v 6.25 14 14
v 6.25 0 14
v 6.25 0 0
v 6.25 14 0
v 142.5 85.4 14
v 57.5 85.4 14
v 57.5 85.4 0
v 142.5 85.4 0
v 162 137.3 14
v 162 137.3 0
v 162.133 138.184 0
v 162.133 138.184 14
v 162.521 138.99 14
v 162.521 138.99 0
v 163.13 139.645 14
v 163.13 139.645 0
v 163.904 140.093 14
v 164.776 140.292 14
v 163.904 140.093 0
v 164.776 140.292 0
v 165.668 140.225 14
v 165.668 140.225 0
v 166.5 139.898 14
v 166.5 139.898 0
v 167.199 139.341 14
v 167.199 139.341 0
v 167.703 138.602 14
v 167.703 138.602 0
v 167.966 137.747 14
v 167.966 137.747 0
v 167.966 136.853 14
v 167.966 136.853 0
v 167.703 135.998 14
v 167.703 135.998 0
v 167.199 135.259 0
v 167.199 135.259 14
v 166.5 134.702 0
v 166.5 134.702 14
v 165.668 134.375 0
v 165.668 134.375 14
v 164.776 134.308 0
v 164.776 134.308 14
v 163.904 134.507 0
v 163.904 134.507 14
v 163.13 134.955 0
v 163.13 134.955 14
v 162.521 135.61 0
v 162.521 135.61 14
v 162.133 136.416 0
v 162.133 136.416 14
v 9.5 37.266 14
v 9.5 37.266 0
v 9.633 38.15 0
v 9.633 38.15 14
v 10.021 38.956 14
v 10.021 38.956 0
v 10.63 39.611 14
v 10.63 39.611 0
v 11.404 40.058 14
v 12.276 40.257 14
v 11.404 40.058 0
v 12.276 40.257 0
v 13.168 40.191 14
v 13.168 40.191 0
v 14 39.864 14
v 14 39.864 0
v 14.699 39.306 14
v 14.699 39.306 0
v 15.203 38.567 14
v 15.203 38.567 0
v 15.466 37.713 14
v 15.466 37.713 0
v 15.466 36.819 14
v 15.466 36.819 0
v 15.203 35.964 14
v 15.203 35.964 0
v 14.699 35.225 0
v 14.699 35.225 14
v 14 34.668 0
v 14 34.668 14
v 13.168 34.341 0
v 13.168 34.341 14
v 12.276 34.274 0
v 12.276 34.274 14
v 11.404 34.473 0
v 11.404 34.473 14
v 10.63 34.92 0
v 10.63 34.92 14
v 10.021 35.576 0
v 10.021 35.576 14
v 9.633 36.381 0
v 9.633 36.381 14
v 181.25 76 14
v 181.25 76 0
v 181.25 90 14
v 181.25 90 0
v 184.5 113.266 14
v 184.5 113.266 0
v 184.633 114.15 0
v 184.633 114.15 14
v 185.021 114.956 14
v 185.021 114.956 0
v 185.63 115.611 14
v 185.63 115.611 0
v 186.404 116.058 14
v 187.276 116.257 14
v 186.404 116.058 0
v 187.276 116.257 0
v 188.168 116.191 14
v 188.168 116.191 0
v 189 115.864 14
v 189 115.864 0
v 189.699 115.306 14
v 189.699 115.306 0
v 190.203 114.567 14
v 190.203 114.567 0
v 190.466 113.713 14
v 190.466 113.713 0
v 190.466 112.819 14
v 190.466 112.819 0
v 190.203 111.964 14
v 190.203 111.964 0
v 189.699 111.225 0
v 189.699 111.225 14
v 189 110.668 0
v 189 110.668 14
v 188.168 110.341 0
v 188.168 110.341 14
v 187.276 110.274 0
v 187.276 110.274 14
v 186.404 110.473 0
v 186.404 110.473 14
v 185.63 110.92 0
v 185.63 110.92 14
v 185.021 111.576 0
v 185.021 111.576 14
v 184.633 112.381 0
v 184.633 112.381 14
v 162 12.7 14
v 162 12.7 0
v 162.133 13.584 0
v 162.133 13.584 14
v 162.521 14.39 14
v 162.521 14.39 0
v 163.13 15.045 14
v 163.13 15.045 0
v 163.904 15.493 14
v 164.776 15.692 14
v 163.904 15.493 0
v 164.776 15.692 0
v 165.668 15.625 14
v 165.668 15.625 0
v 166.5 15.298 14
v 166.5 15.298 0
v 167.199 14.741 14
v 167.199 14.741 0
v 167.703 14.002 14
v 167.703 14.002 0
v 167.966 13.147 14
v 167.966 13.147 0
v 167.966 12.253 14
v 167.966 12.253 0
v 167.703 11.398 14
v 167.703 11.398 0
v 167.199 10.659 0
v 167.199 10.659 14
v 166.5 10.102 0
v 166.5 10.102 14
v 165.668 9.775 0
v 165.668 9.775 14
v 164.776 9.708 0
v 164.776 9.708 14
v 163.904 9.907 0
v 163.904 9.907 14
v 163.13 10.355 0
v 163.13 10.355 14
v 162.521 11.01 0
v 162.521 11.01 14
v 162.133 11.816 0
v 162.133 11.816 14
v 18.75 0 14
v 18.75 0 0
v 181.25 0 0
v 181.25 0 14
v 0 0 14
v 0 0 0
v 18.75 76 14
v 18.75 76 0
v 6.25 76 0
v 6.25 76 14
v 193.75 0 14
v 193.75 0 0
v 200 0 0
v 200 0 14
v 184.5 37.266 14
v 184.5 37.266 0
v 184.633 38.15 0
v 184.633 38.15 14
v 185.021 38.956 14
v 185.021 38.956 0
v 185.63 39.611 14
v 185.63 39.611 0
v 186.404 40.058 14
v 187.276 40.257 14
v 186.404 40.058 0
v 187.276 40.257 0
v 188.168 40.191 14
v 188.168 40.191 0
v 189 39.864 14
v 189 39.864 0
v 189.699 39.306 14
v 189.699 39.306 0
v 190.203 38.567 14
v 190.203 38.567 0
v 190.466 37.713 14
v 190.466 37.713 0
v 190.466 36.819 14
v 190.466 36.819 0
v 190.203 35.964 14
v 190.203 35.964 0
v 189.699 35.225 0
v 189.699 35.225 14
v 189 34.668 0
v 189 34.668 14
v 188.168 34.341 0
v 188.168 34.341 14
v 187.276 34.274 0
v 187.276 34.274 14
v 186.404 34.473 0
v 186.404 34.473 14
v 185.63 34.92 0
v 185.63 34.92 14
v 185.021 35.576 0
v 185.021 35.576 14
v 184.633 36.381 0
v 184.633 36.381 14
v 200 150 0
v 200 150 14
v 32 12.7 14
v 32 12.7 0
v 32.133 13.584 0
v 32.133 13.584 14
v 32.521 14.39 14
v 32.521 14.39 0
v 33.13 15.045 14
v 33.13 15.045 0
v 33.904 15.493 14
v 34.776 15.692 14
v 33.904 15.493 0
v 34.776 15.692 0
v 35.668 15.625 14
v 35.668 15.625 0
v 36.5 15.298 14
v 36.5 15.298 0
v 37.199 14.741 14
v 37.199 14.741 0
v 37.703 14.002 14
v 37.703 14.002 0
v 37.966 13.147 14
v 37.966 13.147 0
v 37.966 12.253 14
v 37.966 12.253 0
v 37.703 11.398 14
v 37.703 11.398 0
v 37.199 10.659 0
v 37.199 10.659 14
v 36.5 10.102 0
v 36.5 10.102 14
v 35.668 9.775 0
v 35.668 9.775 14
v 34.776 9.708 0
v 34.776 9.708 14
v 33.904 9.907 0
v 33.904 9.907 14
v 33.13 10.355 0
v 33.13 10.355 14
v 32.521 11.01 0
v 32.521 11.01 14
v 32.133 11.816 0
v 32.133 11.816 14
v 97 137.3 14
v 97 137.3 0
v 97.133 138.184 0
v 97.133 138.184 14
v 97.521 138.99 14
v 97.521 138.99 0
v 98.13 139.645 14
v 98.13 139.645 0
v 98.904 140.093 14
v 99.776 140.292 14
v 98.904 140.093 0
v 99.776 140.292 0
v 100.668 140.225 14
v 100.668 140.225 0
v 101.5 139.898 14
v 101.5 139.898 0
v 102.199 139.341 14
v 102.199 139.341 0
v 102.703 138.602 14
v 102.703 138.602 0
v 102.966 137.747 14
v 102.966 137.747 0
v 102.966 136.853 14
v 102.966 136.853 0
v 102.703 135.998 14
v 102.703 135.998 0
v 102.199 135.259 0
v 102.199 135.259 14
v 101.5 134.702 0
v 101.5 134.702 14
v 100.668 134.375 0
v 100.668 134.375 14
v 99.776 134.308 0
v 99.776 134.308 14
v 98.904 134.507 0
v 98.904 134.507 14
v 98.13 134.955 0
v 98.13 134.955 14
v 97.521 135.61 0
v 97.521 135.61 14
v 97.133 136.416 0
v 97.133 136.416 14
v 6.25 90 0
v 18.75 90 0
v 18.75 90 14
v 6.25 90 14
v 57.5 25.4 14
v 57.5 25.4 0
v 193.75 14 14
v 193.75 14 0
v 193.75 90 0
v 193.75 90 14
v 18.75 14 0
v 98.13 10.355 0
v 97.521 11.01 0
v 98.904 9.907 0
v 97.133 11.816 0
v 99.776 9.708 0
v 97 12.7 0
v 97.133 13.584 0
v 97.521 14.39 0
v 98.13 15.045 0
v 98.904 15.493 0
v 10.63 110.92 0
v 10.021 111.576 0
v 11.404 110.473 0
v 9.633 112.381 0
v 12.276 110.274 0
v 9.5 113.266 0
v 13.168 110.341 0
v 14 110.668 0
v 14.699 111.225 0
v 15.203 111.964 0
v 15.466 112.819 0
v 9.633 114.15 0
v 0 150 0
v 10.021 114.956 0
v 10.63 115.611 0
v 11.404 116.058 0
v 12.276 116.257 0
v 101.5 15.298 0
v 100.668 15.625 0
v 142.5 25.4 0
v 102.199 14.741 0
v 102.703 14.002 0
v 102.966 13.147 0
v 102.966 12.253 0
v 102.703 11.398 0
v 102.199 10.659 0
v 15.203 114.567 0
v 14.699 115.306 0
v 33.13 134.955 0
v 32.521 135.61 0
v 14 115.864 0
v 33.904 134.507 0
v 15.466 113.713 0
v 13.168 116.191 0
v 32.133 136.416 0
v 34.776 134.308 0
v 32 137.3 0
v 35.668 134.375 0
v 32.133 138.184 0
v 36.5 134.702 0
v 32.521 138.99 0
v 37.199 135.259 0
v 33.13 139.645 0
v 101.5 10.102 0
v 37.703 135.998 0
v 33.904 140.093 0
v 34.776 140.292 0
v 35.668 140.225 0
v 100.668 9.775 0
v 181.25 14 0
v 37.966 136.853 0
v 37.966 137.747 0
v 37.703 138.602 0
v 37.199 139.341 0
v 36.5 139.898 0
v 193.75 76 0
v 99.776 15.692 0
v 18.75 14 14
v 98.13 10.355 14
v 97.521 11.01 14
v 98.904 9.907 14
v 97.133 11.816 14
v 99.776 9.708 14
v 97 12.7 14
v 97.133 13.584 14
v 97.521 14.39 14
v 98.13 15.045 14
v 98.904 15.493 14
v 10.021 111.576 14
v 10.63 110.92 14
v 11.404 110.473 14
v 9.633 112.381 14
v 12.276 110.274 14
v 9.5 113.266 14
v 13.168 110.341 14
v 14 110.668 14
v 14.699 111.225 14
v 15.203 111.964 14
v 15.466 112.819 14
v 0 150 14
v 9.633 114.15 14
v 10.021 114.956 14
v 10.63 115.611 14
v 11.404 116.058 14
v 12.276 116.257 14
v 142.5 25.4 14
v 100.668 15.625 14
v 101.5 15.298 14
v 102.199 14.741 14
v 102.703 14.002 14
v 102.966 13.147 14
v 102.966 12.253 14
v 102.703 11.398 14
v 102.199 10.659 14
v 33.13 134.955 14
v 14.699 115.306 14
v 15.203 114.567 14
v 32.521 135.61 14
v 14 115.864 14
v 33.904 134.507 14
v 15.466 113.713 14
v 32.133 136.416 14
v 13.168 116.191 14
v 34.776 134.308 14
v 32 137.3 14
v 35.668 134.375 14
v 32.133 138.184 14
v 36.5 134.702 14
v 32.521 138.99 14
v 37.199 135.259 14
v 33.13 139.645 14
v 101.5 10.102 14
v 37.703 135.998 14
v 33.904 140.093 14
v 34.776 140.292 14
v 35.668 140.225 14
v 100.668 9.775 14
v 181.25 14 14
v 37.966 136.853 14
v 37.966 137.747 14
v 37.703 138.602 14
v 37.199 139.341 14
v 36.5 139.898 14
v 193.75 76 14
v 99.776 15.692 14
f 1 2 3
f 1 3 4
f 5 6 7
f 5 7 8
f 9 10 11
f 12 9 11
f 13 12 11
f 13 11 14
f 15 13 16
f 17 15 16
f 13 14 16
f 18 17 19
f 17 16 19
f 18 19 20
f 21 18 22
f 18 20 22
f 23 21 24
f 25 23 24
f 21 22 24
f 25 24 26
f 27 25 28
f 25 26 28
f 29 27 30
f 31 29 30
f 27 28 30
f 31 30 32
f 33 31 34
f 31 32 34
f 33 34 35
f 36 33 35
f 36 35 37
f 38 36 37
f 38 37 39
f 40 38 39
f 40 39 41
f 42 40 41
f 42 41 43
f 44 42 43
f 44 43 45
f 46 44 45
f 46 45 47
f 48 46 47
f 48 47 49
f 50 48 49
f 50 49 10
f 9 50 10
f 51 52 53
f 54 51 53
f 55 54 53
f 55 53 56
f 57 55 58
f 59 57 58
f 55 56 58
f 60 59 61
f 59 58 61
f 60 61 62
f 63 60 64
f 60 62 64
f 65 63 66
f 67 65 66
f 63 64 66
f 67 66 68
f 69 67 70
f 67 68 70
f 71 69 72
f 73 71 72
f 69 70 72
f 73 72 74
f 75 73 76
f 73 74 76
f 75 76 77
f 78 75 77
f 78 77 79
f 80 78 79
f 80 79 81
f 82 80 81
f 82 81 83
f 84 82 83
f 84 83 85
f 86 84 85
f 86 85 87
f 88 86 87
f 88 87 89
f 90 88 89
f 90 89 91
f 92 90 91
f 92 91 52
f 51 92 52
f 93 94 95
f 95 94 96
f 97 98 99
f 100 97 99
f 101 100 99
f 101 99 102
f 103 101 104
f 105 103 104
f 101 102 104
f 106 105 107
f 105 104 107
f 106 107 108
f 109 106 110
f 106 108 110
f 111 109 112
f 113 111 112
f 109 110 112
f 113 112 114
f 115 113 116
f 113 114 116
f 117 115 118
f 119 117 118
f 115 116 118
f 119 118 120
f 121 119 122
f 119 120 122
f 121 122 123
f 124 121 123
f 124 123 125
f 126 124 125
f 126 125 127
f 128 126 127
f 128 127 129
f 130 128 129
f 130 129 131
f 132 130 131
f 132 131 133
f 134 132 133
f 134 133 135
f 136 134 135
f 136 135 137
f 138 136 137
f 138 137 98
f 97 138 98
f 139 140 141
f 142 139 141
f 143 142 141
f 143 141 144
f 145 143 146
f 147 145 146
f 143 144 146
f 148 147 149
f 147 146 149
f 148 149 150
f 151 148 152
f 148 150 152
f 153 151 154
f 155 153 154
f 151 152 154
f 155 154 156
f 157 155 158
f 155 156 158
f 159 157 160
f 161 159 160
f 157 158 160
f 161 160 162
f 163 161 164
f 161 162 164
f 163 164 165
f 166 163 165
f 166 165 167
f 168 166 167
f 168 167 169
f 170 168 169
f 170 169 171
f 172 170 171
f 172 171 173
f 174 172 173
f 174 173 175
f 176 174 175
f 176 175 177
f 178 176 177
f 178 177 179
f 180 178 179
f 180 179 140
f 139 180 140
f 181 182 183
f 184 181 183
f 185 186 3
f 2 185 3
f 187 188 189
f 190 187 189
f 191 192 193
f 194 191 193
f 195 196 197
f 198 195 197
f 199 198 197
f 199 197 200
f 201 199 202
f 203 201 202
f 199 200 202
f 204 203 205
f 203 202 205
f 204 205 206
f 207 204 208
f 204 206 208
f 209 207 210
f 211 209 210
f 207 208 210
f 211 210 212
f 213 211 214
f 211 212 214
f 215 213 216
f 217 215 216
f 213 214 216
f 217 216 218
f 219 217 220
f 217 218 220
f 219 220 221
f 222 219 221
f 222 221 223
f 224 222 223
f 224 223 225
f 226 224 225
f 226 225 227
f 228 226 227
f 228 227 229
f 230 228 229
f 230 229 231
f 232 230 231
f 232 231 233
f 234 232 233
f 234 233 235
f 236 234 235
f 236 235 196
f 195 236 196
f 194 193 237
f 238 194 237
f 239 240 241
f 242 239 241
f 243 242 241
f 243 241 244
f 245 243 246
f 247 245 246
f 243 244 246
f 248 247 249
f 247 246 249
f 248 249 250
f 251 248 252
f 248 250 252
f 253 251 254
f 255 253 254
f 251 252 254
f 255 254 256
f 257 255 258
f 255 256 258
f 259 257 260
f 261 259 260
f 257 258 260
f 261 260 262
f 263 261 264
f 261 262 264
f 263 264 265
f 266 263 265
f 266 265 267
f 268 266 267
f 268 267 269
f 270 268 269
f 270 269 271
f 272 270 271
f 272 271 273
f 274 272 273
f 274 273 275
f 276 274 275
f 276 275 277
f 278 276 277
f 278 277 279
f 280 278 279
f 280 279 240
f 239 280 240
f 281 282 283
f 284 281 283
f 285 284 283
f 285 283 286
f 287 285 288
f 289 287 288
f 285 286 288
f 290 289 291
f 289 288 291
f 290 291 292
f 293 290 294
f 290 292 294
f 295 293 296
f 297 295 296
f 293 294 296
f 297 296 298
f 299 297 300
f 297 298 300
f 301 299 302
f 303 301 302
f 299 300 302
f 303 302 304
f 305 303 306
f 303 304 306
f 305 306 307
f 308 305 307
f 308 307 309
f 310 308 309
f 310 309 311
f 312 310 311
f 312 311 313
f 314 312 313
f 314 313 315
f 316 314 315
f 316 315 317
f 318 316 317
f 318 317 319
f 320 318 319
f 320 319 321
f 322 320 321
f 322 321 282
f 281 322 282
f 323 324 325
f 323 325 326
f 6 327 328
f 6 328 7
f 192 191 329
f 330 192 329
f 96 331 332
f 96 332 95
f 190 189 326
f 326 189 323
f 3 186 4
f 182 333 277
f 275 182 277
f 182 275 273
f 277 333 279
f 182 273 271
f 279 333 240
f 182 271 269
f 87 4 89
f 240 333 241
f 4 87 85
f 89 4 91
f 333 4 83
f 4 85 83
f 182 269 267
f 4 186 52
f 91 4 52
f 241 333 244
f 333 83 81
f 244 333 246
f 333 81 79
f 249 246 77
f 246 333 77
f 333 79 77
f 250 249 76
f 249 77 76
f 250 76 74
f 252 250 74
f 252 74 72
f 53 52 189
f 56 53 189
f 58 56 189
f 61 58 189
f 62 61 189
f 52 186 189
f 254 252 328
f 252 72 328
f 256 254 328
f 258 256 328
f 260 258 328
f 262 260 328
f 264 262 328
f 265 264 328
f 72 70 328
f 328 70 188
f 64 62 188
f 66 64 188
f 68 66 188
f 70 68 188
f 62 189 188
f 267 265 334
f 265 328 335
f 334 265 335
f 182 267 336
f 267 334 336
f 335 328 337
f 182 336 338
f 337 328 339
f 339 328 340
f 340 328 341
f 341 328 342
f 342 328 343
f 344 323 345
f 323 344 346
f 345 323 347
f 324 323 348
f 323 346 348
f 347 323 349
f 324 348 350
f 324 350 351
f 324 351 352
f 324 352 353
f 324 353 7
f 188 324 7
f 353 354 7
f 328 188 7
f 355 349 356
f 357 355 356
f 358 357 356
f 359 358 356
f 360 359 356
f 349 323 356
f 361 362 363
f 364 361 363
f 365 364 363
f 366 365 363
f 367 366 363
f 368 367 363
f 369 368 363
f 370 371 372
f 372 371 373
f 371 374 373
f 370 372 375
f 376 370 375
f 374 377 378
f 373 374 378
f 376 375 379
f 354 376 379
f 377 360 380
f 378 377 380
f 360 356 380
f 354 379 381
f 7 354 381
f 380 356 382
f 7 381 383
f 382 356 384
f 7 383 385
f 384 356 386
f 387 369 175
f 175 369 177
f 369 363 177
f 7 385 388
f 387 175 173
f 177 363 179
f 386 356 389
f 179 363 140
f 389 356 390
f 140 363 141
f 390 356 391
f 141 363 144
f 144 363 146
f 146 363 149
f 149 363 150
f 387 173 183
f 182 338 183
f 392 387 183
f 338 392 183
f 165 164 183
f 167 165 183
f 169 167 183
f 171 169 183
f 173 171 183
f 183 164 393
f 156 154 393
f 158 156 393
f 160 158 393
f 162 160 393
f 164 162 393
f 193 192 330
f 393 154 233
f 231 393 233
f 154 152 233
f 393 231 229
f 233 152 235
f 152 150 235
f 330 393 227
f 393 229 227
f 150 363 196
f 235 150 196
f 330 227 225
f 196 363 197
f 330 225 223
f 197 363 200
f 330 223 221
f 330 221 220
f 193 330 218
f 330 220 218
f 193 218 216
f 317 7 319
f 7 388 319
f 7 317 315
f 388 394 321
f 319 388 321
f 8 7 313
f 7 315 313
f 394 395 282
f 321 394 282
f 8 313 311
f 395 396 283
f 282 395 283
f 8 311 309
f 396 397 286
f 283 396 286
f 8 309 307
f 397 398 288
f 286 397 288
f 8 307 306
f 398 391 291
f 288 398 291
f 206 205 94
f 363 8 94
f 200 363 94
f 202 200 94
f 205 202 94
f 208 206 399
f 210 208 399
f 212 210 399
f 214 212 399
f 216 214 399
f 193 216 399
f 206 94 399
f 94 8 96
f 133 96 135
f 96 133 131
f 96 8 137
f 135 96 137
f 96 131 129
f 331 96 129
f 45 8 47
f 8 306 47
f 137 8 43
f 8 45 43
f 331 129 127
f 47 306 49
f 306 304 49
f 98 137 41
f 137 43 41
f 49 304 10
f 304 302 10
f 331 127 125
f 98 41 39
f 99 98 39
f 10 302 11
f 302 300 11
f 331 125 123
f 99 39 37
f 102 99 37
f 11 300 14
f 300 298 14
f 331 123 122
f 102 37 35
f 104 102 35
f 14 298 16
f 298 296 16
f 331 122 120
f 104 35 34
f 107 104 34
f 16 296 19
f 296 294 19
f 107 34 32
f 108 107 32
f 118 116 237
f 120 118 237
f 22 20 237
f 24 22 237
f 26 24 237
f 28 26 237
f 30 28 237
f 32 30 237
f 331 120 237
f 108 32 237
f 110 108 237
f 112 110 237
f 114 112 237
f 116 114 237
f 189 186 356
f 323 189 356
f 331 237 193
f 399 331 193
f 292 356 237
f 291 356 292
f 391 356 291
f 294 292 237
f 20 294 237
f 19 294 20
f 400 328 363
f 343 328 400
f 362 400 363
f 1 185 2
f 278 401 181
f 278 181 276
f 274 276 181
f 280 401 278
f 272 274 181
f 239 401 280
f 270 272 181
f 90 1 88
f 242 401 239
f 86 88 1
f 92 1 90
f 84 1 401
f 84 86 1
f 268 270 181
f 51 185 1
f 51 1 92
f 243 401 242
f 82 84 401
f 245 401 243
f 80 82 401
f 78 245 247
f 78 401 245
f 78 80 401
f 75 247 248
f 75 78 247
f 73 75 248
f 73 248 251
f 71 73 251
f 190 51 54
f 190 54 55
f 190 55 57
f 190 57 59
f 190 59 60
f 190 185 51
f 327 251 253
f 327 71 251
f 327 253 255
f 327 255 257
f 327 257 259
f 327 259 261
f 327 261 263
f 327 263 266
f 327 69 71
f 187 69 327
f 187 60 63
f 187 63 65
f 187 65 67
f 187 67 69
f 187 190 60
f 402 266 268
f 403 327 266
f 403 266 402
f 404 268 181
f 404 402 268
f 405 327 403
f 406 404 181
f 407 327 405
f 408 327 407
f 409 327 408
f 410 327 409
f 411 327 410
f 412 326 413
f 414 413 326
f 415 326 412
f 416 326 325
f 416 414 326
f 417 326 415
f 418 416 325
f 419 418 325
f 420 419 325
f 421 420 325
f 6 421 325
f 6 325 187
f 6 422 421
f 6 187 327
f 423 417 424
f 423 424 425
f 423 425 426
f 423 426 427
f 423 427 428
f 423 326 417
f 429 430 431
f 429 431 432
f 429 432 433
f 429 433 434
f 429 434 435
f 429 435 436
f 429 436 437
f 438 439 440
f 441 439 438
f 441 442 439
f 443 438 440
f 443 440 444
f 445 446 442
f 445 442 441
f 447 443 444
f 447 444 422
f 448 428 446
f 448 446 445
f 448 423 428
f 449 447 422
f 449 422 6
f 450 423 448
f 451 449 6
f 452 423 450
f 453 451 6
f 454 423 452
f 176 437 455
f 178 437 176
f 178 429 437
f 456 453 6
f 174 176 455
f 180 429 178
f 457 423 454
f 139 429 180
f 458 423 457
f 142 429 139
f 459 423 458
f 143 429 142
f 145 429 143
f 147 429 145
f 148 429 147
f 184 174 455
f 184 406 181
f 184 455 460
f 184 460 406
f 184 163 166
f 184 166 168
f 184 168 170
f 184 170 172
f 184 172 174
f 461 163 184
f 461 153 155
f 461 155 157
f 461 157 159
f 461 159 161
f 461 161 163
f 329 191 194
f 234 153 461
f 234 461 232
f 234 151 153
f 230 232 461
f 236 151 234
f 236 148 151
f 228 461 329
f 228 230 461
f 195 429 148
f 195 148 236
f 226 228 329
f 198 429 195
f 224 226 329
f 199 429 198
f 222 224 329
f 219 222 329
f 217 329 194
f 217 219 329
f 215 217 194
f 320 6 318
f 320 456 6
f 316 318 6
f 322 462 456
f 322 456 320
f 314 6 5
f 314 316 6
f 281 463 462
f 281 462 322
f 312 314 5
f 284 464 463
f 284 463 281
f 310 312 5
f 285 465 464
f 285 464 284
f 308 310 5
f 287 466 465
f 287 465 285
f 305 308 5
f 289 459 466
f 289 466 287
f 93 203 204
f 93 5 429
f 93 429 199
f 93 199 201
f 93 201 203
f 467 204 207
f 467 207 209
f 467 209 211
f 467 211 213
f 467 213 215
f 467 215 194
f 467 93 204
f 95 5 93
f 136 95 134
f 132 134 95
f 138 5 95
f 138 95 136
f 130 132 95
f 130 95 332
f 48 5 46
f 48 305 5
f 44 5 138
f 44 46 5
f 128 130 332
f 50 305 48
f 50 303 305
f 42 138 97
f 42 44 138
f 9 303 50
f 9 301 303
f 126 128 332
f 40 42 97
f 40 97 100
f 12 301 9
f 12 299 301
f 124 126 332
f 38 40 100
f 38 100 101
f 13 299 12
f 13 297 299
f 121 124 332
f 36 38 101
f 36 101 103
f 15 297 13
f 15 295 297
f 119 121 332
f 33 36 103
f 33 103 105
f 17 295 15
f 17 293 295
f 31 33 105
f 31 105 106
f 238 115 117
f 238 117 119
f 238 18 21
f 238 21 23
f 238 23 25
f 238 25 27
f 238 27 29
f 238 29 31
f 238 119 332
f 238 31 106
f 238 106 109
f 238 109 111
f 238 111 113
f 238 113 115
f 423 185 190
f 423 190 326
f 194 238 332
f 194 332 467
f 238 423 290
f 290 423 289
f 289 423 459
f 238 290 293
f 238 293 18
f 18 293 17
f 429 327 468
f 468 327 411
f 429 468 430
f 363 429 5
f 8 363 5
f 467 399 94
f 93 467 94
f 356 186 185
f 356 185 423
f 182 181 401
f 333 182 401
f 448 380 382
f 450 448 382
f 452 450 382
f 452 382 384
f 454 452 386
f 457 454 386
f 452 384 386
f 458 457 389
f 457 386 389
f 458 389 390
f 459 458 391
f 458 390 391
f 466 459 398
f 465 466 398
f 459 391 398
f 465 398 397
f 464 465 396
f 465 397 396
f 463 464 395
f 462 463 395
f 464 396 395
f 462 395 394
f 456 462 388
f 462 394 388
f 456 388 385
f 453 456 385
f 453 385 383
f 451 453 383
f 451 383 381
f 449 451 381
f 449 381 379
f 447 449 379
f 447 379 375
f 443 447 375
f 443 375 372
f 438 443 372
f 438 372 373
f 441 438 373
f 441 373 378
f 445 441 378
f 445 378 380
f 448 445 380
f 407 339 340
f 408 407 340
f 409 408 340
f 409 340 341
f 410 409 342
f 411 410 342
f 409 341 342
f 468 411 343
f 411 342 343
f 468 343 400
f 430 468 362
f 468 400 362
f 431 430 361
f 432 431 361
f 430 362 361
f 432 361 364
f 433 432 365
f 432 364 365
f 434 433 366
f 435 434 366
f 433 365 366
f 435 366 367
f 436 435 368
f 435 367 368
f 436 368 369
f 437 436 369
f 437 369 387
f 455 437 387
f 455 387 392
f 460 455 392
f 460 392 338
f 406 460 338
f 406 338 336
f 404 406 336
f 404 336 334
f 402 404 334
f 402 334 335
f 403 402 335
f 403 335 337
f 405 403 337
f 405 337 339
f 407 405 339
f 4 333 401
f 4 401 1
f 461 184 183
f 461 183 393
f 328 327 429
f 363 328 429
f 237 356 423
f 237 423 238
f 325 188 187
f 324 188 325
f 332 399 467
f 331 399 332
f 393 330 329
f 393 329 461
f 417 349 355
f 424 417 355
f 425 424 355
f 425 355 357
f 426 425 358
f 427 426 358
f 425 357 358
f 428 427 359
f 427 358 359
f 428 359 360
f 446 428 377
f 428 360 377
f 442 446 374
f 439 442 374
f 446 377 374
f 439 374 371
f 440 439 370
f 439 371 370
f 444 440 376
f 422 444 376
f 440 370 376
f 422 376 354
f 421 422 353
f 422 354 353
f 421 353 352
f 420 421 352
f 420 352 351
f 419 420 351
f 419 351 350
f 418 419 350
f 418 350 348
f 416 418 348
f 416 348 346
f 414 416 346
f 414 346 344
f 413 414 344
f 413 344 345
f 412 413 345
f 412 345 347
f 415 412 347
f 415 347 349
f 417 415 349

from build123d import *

# Parameters (mm, degrees)
SKETCH1_W                = 200
SKETCH1_H                = 150
BOSS_EXTRUDE1_DEPTH      = 14
SKETCH2_W                = 12.5
SKETCH2_H                = 14
CUT_EXTRUDE1_DEPTH       = 14
F_6_0_6_DIAMETER_HOLE1_D = 6
SKETCH6_W                = 85
SKETCH6_H                = 60
CUT_EXTRUDE2_DEPTH       = 15


with BuildPart() as part:
    # Sketch1 → Boss-Extrude1 (new body)
    with BuildSketch(Plane.XY):
        with Locations((100, 75)):
            Rectangle(SKETCH1_W, SKETCH1_H)
    extrude(amount=BOSS_EXTRUDE1_DEPTH)

    # Sketch2 → Cut-Extrude1 (cut)
    with BuildSketch(Plane(origin=(0, 0, 0), x_dir=(-1, 0, 0), z_dir=(0, 0, -1))):
        with Locations((-12.5, 7)):
            Rectangle(SKETCH2_W, SKETCH2_H)
        with Locations((-187.5, 7)):
            Rectangle(SKETCH2_W, SKETCH2_H)
        with Locations((-12.5, 83)):
            Rectangle(SKETCH2_W, SKETCH2_H)
        with Locations((-187.5, 83)):
            Rectangle(SKETCH2_W, SKETCH2_H)
    extrude(amount=-CUT_EXTRUDE1_DEPTH, mode=Mode.SUBTRACT)

    # Ø6.0 (6) Diameter Hole1 (through all)
    with Locations(Plane.XY.offset(14)):
        with Locations((12.5, 113.265728709), (187.5, 113.265728709), (187.5, 37.265728709), (12.5, 37.265728709), (35, 137.3), (100, 137.3), (165, 137.3), (165, 12.7), (100, 12.7), (35, 12.7)):
            Hole(F_6_0_6_DIAMETER_HOLE1_D / 2)

    # Sketch6 → Cut-Extrude2 (cut, through all)
    with BuildSketch(Plane.XY.offset(14)):
        with Locations((100, 55.4)):
            Rectangle(SKETCH6_W, SKETCH6_H)
    extrude(amount=-CUT_EXTRUDE2_DEPTH, mode=Mode.SUBTRACT)


solid = part.part
